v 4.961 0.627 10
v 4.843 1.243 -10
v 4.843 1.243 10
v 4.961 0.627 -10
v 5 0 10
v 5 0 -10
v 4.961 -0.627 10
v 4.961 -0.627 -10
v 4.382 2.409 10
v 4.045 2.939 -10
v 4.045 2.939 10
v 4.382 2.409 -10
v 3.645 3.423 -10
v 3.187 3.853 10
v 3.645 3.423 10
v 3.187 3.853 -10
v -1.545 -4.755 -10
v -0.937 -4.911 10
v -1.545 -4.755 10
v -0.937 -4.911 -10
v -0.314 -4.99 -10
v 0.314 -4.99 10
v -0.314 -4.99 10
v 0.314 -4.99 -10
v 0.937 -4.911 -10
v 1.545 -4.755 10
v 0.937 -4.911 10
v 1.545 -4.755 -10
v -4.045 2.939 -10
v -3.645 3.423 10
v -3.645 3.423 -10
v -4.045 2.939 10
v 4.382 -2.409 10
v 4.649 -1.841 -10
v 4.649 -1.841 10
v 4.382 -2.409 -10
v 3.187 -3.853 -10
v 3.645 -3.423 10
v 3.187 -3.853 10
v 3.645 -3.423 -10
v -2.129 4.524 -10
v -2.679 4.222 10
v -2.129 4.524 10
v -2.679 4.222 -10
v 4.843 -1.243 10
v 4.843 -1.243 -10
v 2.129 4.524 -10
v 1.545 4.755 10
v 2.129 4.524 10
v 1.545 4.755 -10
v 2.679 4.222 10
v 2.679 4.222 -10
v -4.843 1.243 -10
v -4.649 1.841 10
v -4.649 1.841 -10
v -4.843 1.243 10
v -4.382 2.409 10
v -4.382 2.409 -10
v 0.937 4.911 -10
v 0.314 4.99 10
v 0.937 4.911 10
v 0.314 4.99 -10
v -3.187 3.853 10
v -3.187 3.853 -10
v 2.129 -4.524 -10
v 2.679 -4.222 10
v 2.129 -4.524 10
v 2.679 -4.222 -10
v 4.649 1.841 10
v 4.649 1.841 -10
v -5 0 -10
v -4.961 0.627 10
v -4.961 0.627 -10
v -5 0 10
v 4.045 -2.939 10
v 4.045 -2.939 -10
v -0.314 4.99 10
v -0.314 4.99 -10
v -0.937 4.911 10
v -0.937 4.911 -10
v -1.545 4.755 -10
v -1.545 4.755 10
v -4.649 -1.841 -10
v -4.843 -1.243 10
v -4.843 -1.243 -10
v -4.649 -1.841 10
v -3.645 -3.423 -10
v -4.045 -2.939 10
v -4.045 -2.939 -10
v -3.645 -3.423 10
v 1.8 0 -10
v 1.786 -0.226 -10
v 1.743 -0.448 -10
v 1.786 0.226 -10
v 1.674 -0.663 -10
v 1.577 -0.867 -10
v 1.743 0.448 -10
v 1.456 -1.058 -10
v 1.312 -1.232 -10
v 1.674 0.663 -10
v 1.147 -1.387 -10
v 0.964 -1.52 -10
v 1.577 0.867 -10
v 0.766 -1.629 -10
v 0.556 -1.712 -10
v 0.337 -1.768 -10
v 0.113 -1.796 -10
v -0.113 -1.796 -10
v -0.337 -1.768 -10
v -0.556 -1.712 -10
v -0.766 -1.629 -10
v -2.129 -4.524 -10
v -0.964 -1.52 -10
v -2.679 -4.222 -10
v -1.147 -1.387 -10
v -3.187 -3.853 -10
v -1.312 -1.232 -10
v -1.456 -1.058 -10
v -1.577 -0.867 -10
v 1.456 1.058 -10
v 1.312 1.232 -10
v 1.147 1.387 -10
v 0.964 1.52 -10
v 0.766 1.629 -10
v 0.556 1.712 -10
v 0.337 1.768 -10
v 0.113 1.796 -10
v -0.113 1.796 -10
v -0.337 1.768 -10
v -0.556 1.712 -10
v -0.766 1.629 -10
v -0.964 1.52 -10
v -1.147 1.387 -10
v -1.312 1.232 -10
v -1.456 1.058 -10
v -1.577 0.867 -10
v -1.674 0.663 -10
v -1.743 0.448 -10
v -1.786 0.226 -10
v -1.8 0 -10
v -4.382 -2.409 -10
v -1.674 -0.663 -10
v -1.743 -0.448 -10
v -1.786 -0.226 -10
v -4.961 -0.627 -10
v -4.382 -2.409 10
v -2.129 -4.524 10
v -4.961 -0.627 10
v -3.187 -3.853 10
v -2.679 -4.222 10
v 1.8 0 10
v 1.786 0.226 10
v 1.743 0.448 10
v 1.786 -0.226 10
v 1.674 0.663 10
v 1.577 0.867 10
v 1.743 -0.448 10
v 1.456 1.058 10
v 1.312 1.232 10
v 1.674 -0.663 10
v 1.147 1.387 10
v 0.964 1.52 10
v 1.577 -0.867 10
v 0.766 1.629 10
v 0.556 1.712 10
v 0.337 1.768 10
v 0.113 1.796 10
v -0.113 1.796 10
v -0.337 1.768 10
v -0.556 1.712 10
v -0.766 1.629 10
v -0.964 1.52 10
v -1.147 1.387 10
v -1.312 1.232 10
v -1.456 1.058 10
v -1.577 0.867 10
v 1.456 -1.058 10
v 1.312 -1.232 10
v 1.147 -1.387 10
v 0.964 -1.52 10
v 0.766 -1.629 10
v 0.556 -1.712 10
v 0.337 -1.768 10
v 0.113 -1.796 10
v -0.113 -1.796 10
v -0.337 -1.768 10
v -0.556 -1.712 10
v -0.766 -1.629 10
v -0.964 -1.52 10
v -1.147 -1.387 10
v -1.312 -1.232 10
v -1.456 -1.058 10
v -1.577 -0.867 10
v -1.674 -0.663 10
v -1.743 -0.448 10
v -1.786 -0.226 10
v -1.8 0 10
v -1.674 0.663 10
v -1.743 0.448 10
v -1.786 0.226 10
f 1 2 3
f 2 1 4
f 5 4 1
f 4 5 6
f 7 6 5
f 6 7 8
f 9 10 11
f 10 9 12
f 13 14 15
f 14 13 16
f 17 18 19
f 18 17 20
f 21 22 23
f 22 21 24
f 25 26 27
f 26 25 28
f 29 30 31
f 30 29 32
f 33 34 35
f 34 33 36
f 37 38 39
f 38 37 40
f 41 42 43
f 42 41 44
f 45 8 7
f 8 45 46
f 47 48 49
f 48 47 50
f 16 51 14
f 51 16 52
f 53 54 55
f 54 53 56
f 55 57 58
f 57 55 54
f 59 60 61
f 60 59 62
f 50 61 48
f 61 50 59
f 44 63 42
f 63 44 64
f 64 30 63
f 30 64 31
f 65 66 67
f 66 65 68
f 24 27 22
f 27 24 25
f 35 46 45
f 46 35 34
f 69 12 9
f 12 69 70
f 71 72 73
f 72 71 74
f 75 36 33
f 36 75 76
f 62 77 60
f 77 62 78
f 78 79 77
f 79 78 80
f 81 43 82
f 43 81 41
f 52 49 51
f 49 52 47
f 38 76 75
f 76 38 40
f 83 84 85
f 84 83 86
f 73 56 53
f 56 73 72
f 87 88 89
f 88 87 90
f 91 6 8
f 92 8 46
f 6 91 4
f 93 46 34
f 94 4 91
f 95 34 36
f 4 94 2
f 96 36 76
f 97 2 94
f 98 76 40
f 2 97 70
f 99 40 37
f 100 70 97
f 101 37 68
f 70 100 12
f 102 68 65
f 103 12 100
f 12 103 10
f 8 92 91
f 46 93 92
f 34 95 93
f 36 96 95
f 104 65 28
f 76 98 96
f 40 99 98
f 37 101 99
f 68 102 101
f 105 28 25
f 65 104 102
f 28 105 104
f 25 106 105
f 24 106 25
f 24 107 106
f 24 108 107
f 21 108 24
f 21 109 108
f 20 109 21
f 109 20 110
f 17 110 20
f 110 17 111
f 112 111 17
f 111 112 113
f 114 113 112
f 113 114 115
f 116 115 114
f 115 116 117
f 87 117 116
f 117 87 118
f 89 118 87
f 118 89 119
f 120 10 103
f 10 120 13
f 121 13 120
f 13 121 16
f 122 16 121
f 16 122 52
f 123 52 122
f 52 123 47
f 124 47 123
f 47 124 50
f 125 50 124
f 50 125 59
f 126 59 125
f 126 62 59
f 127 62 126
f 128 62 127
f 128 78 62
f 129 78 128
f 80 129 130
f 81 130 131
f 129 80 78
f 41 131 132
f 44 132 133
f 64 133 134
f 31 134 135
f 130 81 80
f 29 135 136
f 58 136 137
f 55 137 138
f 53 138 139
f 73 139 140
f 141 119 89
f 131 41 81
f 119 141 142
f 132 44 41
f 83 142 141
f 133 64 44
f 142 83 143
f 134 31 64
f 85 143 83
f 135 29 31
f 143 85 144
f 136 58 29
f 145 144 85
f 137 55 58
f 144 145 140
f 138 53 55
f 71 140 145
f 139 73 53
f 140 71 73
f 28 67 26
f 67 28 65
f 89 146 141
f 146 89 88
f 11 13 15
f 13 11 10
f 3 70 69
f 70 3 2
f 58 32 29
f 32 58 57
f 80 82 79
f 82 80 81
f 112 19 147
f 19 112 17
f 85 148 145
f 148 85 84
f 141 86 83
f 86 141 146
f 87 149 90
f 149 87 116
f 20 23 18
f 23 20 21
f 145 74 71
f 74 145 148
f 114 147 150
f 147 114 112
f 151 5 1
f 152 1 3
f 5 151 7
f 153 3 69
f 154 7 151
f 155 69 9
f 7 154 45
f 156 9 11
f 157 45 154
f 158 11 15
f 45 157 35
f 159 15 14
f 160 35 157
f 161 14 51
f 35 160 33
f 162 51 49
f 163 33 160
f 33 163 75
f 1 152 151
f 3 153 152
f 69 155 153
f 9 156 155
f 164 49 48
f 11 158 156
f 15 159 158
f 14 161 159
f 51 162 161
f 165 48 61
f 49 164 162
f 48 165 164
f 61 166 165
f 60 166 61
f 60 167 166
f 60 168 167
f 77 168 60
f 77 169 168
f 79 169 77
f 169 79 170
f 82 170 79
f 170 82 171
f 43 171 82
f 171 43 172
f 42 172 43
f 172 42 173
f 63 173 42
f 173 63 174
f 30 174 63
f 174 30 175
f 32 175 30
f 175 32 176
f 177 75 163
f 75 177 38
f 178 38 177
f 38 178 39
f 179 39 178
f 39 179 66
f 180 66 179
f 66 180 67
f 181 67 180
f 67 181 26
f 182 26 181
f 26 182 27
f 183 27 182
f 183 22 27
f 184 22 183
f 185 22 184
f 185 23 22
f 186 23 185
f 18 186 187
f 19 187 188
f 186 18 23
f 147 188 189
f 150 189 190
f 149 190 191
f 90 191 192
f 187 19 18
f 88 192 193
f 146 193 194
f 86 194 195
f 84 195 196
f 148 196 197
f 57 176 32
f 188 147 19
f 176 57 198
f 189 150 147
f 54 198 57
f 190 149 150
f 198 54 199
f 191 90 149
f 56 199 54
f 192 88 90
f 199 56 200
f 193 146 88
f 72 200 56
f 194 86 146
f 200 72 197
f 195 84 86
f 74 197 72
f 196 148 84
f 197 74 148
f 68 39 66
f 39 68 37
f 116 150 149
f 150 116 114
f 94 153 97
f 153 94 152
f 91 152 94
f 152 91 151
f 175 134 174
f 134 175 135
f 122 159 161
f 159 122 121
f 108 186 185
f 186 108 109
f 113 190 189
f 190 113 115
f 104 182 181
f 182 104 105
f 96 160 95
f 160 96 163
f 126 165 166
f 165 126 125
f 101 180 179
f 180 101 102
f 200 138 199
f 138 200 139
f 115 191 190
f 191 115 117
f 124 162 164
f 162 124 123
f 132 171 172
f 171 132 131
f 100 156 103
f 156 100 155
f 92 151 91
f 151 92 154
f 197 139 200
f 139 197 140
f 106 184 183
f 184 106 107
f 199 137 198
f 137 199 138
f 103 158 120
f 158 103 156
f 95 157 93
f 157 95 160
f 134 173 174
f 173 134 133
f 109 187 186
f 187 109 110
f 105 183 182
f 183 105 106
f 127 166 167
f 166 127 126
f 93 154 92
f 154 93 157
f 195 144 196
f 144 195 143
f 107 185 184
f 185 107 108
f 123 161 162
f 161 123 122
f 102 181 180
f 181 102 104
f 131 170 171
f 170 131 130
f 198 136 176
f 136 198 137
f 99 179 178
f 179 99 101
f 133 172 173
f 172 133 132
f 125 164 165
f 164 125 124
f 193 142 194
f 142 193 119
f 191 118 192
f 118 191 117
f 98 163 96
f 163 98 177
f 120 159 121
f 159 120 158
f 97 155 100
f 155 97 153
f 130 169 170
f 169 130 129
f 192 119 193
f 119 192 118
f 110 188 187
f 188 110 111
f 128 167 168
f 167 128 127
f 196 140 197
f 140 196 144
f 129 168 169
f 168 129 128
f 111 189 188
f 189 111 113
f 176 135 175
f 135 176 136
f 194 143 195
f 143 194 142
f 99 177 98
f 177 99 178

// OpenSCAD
$fn = 50;


difference() {
	union() {
		translate(v = [0, 0, -10.0000000000]) {
			cylinder(h = 20, r = 5.0000000000);
		}
	}
	union() {
		#translate(v = [0, 0, -100.0000000000]) {
			cylinder(h = 200, r = 1.8000000000);
		}
	}
}
